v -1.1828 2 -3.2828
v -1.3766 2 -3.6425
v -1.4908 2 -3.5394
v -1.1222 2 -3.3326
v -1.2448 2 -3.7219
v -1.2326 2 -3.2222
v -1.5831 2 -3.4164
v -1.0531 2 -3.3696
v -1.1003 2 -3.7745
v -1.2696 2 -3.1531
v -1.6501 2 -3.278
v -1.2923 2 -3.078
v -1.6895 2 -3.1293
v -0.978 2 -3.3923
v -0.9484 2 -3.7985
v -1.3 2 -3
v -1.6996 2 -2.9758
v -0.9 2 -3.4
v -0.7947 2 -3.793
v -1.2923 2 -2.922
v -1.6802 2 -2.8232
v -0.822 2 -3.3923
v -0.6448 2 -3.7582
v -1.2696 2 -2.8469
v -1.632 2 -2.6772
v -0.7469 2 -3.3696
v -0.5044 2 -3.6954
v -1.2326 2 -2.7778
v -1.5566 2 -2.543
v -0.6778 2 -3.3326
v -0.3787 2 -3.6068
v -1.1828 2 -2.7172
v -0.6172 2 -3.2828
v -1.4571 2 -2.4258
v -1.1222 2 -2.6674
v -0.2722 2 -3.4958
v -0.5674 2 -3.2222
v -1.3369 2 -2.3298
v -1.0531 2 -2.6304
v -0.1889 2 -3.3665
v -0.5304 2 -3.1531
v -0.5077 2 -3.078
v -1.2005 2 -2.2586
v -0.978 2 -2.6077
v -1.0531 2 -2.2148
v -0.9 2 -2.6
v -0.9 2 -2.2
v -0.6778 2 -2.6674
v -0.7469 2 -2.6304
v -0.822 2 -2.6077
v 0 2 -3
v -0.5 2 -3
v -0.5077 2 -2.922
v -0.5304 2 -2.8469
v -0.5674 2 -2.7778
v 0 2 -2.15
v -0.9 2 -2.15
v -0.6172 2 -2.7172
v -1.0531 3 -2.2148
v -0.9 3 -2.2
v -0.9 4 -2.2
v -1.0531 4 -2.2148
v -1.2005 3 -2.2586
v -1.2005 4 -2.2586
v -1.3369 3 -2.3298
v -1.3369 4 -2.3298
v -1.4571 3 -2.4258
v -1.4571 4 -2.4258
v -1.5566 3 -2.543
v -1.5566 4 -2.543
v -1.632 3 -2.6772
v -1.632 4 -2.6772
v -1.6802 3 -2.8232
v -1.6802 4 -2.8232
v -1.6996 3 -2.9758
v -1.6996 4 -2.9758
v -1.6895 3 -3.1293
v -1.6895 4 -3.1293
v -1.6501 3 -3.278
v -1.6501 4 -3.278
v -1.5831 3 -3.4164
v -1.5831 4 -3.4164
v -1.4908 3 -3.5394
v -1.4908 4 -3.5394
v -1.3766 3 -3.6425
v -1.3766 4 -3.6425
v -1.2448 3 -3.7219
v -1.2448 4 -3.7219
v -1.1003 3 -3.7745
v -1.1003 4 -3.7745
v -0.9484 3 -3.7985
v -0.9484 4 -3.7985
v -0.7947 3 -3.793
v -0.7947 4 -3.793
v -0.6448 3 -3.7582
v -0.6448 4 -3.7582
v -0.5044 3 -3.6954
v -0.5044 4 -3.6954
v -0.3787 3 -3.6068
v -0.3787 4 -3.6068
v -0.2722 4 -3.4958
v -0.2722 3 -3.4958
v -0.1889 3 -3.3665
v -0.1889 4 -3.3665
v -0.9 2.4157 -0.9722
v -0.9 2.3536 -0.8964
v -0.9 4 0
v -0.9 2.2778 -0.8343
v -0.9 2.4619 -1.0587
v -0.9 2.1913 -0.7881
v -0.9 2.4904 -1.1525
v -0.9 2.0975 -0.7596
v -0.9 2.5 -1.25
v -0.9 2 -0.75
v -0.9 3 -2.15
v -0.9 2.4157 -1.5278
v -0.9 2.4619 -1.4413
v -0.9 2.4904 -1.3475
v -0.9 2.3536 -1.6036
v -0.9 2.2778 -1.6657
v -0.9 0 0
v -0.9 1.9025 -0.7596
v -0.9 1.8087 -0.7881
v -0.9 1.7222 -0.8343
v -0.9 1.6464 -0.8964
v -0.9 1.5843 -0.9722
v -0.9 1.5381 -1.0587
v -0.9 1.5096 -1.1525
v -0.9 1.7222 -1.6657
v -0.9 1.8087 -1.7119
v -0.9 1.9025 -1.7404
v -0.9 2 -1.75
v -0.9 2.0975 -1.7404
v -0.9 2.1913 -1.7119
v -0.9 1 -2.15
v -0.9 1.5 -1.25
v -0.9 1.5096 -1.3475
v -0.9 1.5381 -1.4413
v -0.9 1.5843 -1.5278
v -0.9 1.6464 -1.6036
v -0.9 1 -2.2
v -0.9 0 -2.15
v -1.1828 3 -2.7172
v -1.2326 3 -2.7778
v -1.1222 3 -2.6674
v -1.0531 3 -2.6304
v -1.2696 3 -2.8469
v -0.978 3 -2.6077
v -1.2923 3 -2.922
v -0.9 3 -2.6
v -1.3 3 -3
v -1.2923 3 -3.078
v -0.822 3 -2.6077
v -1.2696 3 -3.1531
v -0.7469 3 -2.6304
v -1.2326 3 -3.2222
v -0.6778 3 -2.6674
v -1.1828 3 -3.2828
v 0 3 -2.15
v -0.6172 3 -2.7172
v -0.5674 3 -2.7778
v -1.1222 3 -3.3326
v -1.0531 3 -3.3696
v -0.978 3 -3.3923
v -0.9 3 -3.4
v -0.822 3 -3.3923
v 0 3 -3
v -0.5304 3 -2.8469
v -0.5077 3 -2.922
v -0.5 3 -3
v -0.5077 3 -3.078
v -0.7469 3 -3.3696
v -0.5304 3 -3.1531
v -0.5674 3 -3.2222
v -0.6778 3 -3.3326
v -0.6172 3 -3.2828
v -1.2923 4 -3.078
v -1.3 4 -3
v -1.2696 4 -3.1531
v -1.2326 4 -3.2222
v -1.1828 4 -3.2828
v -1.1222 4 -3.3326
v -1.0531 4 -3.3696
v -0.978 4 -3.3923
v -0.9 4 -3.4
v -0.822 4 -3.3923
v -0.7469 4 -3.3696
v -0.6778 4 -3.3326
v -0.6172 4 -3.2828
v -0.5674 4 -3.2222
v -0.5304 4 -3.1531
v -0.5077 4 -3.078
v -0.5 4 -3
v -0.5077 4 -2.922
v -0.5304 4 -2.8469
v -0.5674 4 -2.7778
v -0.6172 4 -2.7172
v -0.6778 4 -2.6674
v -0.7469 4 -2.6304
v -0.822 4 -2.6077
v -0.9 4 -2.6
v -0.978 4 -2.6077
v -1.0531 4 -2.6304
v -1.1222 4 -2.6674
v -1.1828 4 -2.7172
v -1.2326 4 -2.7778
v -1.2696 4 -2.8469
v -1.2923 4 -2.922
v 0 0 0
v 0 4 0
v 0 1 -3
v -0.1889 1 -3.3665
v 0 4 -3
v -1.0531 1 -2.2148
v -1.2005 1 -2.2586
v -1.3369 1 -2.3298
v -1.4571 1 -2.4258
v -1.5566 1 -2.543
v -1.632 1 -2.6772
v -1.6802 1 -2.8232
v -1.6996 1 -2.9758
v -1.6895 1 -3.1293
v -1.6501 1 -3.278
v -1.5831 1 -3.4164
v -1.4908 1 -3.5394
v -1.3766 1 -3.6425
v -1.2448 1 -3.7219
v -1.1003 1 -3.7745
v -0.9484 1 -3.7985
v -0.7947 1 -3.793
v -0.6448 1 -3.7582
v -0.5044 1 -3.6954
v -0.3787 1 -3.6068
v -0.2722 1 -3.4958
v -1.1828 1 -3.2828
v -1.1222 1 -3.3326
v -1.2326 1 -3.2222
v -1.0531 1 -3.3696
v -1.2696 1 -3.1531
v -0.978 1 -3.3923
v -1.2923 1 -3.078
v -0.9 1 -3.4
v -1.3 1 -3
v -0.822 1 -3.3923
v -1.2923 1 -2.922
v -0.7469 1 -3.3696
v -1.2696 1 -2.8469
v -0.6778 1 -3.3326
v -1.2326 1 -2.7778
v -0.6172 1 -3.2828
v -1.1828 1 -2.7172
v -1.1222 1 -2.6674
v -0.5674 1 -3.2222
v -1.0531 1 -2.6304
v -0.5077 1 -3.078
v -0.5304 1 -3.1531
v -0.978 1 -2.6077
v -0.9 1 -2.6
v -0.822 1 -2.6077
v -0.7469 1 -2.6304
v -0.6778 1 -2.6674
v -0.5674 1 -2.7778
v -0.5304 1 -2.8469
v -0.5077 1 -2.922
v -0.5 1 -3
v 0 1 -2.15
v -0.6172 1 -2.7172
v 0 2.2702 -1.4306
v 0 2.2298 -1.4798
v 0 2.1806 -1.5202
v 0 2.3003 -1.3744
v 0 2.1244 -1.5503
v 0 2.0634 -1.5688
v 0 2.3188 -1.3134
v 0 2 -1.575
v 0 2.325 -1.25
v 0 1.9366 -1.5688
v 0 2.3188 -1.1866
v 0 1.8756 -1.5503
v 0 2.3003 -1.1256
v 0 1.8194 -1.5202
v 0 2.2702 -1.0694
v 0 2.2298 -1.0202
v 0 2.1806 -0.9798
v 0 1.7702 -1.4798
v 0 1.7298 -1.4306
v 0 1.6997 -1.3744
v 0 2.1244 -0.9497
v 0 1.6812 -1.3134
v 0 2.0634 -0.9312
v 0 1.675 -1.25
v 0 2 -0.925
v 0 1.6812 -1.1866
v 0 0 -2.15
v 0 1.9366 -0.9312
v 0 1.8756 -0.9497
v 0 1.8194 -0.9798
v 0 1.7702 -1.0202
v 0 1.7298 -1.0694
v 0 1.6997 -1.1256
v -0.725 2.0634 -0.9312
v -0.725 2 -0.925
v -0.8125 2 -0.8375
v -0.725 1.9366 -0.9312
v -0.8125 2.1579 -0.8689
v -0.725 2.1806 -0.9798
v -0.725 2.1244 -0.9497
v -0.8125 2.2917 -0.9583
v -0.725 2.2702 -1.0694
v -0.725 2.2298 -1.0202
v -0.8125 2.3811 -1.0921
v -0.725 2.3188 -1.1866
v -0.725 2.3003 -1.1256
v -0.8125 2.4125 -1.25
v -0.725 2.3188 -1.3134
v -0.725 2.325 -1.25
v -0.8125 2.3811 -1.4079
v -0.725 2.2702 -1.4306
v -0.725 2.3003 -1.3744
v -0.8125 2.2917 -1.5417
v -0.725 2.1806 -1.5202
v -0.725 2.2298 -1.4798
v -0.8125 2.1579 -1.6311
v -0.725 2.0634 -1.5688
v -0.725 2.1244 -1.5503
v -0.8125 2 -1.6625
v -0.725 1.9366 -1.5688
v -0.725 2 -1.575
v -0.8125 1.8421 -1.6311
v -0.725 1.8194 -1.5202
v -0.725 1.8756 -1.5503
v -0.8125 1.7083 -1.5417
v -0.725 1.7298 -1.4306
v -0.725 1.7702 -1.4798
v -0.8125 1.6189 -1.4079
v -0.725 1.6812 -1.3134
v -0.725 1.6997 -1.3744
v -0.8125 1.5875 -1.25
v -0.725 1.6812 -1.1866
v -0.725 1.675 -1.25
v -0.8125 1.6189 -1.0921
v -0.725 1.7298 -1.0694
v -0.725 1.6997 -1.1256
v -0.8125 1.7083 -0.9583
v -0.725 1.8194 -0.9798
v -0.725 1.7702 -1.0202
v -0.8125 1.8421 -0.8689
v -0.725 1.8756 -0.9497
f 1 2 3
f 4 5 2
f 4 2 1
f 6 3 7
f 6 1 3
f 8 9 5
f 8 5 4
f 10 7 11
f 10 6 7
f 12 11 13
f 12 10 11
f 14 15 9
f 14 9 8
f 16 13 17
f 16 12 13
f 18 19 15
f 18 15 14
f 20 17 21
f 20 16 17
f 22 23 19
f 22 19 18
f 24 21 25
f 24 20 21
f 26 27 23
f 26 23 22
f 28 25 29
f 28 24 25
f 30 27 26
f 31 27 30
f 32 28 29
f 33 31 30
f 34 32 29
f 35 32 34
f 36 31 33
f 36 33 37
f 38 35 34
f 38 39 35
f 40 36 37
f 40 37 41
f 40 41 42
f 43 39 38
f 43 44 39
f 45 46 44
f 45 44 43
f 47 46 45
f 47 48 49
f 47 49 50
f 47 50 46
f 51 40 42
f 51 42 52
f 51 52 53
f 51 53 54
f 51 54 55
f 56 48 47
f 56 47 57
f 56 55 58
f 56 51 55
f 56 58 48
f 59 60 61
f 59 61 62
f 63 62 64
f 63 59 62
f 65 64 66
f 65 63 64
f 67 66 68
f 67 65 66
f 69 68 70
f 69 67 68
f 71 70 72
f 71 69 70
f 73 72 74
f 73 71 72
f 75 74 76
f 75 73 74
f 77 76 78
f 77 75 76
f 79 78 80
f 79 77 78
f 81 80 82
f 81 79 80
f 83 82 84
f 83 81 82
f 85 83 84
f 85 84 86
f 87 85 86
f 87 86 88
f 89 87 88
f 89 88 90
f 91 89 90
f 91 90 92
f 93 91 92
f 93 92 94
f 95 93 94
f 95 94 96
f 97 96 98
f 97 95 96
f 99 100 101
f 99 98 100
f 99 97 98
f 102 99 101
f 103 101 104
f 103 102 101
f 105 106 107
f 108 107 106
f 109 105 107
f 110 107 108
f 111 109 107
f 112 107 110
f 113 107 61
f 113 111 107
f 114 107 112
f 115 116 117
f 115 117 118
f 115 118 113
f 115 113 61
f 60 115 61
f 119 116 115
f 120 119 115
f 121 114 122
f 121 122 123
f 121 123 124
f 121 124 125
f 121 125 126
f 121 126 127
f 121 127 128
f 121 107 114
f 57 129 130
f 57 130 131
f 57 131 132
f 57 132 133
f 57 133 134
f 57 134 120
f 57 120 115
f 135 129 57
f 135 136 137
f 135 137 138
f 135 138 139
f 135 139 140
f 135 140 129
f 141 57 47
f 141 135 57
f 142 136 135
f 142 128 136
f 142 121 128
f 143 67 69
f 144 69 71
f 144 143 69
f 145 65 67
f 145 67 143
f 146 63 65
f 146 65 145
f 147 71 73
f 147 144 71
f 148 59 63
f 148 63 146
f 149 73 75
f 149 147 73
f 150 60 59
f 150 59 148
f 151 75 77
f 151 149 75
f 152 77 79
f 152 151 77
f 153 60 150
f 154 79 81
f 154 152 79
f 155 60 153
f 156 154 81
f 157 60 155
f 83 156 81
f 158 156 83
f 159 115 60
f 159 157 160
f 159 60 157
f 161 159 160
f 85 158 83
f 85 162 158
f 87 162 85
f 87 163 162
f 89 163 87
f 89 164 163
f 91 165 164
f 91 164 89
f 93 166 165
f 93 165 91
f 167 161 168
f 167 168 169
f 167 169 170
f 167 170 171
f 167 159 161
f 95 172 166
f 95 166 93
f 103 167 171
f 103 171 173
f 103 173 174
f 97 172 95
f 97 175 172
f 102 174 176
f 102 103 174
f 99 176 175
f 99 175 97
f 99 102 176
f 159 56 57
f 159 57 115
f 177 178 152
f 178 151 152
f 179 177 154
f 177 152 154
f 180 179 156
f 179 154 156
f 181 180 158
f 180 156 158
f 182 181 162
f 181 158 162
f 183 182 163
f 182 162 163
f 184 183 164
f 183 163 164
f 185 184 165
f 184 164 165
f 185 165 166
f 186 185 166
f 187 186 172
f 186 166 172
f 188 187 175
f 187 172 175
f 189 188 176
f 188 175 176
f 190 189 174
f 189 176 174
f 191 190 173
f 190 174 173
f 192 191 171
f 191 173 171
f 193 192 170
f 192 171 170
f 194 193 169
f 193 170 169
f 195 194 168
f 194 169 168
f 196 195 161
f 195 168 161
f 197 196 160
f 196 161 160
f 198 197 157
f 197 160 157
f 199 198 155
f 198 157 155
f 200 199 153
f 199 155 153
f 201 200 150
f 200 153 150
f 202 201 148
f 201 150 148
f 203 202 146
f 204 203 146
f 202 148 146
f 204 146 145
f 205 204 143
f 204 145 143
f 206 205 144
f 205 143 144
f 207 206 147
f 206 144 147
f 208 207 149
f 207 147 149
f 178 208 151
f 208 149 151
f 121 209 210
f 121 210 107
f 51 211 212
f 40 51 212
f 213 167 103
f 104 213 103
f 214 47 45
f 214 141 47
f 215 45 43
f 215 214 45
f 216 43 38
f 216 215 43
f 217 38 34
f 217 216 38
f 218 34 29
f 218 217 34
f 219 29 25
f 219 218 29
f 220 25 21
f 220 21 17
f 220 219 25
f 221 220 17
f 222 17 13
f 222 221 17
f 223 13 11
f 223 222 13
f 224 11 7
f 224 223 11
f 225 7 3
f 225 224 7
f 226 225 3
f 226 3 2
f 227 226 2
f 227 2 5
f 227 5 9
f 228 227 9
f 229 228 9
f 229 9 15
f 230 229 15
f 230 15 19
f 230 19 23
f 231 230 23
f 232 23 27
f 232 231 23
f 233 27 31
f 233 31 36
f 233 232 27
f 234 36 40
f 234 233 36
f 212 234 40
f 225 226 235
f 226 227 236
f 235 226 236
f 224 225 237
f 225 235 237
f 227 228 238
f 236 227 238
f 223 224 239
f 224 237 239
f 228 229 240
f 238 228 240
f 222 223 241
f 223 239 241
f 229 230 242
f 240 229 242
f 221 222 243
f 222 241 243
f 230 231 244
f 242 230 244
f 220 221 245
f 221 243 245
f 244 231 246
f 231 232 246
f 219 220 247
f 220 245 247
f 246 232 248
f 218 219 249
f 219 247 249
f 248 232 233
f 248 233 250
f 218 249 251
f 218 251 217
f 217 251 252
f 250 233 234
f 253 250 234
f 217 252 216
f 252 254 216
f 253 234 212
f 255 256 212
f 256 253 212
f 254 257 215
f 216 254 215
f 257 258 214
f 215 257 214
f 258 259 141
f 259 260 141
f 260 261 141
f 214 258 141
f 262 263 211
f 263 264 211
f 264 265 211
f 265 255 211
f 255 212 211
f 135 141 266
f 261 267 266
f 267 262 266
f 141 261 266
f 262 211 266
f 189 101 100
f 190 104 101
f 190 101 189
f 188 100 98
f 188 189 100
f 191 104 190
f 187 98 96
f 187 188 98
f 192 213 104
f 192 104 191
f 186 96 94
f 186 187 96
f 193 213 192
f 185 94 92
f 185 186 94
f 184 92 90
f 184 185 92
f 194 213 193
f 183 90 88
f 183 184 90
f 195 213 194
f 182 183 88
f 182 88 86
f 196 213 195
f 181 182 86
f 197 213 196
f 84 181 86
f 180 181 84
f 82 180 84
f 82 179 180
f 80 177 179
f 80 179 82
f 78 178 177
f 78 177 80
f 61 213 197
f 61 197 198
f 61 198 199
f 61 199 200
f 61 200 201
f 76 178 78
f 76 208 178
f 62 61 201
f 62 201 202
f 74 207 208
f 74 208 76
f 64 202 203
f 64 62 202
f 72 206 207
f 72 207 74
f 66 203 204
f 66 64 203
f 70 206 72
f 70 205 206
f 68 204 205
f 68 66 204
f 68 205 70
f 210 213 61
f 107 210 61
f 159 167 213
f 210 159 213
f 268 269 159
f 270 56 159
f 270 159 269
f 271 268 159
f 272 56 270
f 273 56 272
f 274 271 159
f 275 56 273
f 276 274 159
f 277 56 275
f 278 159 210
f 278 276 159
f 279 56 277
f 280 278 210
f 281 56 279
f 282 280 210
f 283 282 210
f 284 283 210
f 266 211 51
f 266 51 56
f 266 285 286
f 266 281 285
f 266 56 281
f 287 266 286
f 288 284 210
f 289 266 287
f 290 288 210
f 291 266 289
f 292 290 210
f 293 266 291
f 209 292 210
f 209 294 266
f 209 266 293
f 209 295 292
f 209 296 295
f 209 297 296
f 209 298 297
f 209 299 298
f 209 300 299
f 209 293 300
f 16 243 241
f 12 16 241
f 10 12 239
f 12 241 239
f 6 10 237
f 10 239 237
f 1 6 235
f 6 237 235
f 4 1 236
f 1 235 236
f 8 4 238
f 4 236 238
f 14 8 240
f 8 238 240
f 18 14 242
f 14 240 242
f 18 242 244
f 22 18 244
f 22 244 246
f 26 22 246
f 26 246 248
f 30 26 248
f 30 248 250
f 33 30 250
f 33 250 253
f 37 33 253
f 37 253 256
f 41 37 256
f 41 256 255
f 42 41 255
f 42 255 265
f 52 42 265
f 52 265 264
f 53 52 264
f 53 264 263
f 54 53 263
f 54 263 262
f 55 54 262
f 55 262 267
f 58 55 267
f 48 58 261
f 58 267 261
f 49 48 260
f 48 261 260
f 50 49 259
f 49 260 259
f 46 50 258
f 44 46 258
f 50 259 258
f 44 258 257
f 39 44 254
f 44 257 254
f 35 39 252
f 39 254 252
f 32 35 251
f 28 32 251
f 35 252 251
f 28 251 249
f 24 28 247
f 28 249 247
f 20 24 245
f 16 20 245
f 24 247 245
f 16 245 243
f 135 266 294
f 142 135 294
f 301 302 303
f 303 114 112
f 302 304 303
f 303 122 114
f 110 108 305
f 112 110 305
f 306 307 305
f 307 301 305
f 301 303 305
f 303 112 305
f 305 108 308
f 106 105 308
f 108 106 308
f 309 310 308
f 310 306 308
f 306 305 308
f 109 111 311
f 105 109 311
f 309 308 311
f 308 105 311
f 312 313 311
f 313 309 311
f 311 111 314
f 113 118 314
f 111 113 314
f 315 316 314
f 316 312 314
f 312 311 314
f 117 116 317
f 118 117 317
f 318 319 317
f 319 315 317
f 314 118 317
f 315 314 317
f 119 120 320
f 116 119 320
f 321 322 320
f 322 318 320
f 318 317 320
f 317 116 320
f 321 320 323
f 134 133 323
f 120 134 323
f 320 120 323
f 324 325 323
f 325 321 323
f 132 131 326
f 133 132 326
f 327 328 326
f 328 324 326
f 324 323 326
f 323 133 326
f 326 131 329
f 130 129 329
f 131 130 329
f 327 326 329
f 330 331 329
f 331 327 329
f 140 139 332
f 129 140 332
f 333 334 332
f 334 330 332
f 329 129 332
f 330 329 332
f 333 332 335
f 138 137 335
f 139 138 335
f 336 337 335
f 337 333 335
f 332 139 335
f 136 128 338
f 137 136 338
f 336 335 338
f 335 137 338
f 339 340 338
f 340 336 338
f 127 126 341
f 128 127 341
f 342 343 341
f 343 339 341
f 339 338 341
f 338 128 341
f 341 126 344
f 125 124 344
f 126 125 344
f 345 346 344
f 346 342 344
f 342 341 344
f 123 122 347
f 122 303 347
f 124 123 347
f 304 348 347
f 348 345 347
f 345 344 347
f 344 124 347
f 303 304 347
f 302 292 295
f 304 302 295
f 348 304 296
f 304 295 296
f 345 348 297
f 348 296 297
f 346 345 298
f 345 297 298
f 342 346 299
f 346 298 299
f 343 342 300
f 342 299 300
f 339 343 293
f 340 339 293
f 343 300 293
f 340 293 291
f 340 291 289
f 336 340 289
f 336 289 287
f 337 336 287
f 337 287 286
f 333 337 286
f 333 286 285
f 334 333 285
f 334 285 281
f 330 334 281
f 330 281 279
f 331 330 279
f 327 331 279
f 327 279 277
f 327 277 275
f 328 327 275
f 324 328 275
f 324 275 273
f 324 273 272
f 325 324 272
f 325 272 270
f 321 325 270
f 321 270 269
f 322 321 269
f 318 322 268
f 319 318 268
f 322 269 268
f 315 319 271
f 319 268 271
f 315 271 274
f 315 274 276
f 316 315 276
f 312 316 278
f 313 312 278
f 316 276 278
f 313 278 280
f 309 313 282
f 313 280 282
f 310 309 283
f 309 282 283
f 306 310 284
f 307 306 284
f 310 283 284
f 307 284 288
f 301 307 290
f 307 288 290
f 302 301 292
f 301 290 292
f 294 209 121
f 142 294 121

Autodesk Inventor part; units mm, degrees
ref_plane "YZ Plane" through (0, 0, 0) normal (1, 0, 0) x (0, 1, 0)
ref_plane "XZ Plane" through (0, 0, 0) normal (0, 1, 0) x (-1, 0, 0)
ref_plane "XY Plane" through (0, 0, 0) normal (0, 0, 1) x (1, 0, 0)
sketch "Skizze1" plane through (0, 0, 0) normal (0, 1, 0) x (-1, 0, 0)
  line L0 (0, 0) -> (0.9, 0)
  line L1 (0.9, 0) -> (0.9, -3)
  line L2 (0.9, -3) -> (0, -3) construction
  line L3 (0, -3) -> (0, 0)
  circle A0 centre (0.9, -3) radius 0.4
  arc A1 (0.1889, -3.3665) -> (0.9, -2.2) centre (0.9, -3) ccw
  line L4 (0, -3) -> (0.1889, -3.3665)
  dimension "d0" = 0.9
  dimension "d2" = 0.8
  dimension "d3" = 1.6
  dimension "d4" = 3
extrude "Extrusion1" add sketch "Skizze1" along normal blind 4
sketch "Skizze2" plane through (0, 0, 0) normal (1, 0, 0) x (0, 0, -1)
  line L0 (3, 0) -> (0, 0) construction
  line L1 (3, 0) -> (3, 4) construction
  line L2 (0, 4) -> (3, 4) construction
  line L3 (0, 0) -> (0, 4) construction
  line L4 (0, 4) -> (3, 4) construction
  line L5 (2.15, 4) -> (2.15, 0) construction
  line L6 (2.15, 0) -> (4.15, 0)
  line L7 (4.15, 0) -> (4.15, 1)
  line L8 (4.15, 1) -> (2.15, 1)
  line L9 (2.15, 1) -> (2.15, 0)
  line L10 (2.15, 3) -> (4.15, 3)
  line L11 (4.15, 3) -> (4.15, 2)
  line L12 (4.15, 2) -> (2.15, 2)
  line L13 (2.15, 2) -> (2.15, 3)
  dimension "d7" = 0.85
  dimension "d8" = 2
  dimension "d9" = 1
  dimension "d10" = 1
  dimension "d11" = 1
extrude "Extrusion2" cut sketch "Skizze2" against normal blind 4
sketch "Skizze4" plane through (-0.9, 0, 0) normal (-1, 0, 0) x (0, 0, 1)
  line L0 (-2.15, 1) -> (-2.15, 0) construction
  line L1 (0, 0) -> (-2.15, 0) construction
  line L2 (0, 0) -> (0, 4) construction
  line L3 (-2.2, 4) -> (0, 4) construction
  line L4 (-2.2, 3) -> (-2.2, 4) construction
  line L5 (-2.2, 3) -> (-2.15, 3) construction
  line L6 (-2.15, 3) -> (-2.15, 2) construction
  line L7 (-2.15, 2) -> (-2.2, 2) construction
  line L8 (-2.2, 1) -> (-2.2, 2) construction
  line L9 (-2.2, 1) -> (-2.15, 1) construction
  line L10 (0, 0) -> (0, 4) construction
  line L11 (0, 2) -> (-2.15, 2) construction
  line L12 (-1.25, 4) -> (-1.25, 0) construction
  point P0 (-1.25, 2)
  dimension "d22" = 1.25
hole "Bohrung2" at (-0.9, 2, -1.25) direction (1, 0, 0) diameter 0.65 end through all countersink diameter 1 countersink angle 90
properties part number "item_scharnier_1_teil"
